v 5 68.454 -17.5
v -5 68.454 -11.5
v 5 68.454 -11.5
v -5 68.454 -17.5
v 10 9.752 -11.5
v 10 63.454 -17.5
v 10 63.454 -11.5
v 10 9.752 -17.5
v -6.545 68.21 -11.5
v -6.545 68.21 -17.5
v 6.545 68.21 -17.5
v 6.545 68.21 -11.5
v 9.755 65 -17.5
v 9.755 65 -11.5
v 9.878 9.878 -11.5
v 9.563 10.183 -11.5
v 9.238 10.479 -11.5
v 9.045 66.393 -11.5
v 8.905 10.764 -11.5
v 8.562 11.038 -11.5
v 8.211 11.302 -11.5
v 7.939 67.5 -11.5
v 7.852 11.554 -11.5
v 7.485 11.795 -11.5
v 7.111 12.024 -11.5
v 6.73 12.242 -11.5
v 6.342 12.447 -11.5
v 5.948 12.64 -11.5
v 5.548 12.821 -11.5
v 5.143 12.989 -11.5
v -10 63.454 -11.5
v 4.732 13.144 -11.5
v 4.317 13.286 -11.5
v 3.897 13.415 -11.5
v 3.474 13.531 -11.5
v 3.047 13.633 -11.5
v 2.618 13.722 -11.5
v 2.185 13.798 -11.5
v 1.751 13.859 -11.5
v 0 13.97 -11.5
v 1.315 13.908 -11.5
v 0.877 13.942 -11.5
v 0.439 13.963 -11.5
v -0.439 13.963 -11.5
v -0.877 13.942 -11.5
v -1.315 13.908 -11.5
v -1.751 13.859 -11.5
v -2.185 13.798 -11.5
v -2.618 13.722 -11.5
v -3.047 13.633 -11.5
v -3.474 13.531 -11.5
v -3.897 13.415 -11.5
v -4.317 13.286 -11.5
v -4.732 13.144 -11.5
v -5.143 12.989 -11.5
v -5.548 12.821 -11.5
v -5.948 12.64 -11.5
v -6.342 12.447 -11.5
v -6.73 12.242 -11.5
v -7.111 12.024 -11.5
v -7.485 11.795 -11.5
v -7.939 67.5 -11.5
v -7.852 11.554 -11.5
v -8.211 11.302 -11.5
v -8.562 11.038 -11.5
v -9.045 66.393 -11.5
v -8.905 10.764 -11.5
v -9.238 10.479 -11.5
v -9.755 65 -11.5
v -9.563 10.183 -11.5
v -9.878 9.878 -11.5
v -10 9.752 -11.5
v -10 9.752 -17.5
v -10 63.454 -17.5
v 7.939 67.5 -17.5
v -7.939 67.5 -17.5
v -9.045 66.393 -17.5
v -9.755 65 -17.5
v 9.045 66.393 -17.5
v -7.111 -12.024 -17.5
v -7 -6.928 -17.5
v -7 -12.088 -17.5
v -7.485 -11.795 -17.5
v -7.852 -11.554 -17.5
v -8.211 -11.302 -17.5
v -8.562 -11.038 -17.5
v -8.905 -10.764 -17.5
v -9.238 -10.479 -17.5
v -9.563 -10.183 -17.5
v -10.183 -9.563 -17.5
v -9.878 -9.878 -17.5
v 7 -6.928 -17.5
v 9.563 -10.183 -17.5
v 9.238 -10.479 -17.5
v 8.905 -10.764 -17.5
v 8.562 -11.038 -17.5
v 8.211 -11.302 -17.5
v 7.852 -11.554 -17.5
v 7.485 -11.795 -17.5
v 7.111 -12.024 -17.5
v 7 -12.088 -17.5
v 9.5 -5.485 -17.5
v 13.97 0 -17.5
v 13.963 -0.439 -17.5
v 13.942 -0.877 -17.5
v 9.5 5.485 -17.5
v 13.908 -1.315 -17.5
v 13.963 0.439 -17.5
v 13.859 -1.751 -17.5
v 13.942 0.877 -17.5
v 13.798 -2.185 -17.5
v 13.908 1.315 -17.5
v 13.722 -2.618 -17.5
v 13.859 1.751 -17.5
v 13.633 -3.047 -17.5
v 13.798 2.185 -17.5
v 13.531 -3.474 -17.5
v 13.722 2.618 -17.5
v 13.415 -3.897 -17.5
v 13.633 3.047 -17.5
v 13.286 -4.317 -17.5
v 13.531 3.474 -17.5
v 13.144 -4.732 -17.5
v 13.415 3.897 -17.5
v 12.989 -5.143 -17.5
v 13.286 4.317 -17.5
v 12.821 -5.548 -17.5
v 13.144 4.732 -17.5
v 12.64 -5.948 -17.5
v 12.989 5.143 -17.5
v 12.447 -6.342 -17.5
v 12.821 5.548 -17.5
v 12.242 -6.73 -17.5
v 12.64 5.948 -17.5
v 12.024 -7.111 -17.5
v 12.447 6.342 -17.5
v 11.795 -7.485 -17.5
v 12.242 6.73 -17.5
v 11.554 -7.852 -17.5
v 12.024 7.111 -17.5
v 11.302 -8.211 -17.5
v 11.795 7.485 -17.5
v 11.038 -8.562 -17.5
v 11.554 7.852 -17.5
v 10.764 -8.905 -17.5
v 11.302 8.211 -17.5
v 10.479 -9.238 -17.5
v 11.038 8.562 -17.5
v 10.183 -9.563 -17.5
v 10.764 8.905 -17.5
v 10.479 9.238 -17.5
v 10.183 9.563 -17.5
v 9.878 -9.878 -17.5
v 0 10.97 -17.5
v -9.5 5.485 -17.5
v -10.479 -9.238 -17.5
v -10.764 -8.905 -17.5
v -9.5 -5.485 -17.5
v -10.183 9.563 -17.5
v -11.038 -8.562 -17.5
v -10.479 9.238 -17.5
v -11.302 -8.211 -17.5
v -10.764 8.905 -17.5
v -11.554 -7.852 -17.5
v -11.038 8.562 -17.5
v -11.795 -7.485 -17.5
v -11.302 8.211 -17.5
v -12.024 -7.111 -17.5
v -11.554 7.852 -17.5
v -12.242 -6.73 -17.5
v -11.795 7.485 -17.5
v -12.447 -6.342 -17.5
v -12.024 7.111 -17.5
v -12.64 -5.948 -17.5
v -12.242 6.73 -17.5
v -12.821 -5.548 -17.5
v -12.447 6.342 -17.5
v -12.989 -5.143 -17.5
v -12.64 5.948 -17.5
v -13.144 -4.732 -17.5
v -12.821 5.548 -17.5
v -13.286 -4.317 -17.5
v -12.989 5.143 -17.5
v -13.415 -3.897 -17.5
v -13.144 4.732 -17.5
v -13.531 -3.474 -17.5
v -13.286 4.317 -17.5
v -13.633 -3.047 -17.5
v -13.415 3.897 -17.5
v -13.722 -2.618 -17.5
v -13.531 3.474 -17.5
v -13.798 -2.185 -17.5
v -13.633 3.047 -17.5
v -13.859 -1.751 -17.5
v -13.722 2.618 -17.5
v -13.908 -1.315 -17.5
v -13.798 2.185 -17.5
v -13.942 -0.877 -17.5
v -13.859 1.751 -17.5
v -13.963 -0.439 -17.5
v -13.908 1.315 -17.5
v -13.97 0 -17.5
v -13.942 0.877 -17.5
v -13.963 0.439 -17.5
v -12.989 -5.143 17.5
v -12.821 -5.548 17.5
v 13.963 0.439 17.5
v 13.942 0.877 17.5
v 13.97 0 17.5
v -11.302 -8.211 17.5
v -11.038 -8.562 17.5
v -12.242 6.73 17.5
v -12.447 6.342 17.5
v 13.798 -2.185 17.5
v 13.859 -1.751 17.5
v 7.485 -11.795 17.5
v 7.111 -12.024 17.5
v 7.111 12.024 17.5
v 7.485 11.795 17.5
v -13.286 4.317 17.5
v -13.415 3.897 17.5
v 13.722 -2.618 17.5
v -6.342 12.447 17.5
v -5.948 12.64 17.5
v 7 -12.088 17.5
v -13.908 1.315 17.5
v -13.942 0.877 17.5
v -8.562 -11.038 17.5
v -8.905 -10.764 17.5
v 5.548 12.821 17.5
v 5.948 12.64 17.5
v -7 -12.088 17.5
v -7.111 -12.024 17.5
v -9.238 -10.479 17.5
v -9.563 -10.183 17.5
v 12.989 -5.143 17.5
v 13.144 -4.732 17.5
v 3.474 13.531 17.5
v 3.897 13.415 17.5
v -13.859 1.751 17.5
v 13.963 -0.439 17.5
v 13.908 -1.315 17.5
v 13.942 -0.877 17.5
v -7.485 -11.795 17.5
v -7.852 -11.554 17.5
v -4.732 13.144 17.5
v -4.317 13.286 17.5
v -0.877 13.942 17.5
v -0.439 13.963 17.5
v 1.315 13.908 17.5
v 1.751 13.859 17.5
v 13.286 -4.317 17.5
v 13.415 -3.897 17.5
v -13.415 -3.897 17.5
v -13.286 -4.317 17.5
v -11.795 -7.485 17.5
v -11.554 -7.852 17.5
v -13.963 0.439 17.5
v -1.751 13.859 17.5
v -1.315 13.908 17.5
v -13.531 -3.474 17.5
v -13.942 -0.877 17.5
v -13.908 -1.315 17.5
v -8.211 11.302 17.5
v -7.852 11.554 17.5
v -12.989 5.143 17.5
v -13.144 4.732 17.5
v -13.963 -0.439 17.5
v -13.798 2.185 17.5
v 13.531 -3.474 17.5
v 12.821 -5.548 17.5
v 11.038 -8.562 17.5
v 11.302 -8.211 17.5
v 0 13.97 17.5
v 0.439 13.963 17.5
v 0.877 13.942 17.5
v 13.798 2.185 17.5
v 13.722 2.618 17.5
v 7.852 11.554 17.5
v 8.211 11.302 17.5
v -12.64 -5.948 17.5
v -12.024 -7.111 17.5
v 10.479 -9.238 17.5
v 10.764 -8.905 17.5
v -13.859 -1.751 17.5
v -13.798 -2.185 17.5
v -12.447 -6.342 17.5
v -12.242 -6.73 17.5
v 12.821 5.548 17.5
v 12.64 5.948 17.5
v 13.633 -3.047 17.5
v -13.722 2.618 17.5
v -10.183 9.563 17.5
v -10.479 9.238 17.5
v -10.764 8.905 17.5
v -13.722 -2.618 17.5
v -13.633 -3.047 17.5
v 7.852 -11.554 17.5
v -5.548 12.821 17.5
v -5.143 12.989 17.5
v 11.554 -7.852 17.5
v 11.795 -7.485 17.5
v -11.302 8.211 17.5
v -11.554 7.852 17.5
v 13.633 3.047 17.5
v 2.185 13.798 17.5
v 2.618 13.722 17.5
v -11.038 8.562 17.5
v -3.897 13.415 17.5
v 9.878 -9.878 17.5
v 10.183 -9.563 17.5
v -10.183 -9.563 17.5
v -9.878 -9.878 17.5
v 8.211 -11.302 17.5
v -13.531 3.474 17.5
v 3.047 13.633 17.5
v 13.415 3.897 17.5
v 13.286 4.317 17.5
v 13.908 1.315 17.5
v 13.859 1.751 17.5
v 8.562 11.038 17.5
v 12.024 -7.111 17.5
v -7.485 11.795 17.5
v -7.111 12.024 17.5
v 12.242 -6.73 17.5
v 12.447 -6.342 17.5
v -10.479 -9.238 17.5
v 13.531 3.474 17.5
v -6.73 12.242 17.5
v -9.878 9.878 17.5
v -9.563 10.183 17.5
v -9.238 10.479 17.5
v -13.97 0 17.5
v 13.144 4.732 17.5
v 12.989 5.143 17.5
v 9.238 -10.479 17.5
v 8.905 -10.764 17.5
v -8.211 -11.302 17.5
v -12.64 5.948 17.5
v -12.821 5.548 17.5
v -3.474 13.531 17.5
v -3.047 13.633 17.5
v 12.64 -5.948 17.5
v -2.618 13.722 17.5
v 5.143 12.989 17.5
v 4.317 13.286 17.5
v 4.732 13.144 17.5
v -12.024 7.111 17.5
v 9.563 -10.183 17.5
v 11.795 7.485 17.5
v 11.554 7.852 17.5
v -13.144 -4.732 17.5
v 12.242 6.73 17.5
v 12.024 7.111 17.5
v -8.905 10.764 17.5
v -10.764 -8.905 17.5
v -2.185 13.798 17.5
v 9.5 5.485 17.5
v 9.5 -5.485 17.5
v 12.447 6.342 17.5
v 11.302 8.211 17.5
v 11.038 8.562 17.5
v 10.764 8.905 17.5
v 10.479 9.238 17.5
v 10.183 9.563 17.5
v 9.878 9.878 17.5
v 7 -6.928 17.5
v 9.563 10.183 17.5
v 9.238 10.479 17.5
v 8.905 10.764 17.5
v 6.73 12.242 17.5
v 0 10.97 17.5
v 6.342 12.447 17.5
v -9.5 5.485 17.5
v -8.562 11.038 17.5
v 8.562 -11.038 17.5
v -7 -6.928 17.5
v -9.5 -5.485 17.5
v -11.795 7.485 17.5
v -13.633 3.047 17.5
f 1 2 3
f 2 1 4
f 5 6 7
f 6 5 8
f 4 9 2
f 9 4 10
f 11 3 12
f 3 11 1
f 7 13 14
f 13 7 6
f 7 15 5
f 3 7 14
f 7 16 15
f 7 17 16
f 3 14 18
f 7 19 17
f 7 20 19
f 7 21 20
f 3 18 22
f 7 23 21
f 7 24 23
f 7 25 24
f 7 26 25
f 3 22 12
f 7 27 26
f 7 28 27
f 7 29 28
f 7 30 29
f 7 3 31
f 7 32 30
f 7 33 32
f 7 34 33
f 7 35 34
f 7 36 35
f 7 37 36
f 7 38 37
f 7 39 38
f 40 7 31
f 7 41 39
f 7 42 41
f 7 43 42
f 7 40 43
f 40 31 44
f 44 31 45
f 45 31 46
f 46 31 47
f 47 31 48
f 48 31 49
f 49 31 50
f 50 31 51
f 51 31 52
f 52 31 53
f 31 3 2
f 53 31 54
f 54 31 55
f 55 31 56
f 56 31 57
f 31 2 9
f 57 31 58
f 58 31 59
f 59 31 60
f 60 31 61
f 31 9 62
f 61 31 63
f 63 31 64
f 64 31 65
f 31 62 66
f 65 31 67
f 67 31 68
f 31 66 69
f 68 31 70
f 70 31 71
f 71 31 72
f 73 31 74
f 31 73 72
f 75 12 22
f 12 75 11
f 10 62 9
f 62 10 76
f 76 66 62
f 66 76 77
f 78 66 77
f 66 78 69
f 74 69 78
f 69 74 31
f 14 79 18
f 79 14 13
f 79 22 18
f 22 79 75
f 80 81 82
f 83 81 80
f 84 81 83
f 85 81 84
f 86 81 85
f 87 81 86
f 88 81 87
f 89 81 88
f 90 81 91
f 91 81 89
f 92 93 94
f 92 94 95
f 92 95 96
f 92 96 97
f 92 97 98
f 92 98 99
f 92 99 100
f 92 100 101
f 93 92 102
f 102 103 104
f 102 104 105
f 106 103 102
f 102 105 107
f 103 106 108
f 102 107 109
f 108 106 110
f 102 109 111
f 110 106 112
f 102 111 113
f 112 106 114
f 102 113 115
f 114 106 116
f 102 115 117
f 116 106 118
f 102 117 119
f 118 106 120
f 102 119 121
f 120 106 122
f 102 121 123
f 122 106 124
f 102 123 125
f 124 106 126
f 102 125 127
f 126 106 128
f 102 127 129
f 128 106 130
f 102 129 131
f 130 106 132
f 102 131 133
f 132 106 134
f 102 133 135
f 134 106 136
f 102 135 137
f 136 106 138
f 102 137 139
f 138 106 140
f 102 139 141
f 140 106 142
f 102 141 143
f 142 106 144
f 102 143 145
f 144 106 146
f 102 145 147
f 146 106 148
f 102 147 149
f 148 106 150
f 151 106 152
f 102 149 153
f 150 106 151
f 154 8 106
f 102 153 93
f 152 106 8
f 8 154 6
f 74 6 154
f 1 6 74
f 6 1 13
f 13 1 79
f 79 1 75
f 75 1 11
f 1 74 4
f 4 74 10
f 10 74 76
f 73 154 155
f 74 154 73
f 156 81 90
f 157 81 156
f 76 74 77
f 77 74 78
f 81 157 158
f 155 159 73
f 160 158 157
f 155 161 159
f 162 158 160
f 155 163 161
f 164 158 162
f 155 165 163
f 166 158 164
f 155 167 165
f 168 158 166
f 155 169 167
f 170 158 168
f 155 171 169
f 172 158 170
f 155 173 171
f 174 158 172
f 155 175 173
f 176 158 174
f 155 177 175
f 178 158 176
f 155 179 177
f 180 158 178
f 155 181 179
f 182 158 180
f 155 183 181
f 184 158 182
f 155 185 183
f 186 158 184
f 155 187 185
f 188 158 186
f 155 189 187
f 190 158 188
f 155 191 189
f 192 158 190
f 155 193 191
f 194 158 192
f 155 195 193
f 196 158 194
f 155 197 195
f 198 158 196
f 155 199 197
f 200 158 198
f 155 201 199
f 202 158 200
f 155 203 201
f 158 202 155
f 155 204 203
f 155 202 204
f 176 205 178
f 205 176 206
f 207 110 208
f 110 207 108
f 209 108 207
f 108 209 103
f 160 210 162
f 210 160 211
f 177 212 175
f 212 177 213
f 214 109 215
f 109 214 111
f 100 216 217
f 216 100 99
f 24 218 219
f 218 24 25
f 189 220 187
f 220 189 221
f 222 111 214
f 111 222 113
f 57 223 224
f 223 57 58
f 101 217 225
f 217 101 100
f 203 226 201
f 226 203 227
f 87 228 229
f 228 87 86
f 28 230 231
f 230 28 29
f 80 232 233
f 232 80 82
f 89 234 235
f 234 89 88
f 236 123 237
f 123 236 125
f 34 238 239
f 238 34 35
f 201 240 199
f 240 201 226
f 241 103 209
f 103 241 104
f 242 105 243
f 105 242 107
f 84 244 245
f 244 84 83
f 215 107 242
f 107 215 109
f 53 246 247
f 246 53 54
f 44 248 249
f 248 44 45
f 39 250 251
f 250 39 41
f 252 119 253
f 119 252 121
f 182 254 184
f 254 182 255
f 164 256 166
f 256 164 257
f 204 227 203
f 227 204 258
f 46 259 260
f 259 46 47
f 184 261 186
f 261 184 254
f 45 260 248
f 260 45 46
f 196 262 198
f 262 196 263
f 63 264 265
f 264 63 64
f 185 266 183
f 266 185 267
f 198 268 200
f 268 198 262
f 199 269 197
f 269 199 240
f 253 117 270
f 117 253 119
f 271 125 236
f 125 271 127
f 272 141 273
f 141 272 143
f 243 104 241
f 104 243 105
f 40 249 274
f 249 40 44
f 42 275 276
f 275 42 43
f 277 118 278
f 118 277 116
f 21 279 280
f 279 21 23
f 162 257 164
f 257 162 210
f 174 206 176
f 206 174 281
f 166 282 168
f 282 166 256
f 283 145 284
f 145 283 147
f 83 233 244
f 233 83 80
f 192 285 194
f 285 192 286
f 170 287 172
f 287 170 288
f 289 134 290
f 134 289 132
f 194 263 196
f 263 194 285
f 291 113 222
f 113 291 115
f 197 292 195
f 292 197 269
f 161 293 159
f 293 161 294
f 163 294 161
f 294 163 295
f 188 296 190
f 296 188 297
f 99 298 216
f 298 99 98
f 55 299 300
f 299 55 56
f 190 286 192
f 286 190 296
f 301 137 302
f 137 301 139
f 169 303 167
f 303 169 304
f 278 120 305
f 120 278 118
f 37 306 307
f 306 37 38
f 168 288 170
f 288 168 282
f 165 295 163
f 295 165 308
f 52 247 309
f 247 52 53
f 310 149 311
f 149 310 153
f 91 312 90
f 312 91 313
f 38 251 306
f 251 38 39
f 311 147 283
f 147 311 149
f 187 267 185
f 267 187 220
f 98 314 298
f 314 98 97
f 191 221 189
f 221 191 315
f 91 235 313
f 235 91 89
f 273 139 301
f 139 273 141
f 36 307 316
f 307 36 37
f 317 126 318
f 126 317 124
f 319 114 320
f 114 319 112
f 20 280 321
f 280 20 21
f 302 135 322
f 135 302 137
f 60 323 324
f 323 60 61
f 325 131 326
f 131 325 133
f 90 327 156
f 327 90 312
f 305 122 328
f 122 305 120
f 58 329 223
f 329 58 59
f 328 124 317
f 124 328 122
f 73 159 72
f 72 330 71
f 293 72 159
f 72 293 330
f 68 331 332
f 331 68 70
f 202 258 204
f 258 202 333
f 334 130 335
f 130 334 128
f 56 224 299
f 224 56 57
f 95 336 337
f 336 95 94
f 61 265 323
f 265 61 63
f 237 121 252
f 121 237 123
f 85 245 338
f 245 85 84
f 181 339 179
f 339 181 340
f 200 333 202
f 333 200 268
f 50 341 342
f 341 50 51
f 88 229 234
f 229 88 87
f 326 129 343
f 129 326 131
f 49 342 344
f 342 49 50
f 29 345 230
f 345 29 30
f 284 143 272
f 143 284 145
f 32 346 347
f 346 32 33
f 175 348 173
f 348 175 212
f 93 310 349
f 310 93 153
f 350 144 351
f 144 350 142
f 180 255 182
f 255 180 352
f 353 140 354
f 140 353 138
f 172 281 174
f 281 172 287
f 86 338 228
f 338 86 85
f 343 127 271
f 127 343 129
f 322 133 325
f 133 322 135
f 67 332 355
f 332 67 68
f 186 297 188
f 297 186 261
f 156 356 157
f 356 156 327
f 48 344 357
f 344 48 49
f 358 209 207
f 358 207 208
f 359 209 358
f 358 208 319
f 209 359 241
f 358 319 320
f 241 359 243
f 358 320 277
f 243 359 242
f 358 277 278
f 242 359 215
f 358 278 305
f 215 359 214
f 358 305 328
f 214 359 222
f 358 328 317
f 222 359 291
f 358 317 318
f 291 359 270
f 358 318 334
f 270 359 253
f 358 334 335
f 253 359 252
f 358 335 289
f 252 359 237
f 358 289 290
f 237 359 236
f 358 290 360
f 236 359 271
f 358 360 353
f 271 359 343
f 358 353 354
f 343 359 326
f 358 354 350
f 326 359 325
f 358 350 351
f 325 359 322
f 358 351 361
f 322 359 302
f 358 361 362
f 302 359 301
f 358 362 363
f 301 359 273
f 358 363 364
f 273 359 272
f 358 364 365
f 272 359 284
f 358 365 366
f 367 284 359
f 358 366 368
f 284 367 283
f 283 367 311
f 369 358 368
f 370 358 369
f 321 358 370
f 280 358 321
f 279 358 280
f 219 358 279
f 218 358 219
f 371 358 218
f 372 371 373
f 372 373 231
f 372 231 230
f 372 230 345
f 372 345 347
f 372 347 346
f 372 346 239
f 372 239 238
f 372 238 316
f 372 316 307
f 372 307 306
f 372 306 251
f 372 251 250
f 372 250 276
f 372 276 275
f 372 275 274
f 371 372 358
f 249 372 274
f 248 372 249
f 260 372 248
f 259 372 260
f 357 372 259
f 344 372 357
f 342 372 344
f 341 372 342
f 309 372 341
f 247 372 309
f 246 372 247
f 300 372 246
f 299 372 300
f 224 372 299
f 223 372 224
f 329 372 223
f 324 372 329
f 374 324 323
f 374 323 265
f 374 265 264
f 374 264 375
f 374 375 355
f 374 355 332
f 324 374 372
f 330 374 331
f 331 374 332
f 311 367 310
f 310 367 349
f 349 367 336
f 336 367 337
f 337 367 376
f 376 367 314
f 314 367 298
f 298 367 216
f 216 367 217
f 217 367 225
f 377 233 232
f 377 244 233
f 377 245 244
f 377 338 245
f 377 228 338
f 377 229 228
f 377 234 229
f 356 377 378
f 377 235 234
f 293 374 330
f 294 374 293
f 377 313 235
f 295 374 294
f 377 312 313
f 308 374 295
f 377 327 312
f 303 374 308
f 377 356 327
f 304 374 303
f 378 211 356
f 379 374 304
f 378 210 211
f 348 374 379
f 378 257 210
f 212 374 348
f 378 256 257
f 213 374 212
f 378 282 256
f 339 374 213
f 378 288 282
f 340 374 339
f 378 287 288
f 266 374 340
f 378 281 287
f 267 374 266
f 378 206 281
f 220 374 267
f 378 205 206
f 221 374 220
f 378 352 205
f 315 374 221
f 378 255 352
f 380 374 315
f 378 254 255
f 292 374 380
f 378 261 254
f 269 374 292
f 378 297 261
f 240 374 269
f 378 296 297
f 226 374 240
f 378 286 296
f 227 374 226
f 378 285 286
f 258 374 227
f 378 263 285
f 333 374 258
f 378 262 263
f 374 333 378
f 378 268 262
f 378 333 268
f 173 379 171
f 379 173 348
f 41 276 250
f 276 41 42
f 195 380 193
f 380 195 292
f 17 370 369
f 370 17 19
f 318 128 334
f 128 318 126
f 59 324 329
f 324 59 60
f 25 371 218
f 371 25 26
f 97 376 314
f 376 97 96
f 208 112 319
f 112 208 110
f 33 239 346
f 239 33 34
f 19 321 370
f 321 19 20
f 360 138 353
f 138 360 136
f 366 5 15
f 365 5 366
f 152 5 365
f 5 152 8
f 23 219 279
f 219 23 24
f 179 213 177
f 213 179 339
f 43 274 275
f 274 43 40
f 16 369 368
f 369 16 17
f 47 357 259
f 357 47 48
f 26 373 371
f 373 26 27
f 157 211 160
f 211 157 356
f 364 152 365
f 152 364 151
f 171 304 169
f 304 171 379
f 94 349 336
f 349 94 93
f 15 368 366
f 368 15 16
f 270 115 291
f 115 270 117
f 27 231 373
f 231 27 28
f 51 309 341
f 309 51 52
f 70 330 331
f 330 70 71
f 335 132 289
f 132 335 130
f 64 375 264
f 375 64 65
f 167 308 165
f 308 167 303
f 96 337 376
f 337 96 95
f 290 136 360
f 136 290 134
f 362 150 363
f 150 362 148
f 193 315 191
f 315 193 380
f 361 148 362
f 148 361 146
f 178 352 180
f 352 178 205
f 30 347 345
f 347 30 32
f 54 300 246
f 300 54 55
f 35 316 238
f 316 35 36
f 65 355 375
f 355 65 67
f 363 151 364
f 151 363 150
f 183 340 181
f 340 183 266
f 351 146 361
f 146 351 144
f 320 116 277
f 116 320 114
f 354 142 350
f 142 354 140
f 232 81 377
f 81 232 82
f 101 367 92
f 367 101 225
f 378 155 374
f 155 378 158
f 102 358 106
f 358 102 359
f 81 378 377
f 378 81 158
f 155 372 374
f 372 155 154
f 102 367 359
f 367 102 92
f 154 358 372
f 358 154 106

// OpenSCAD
nutDiameter = 19; // [6.0:0.1:100.1]
nutHeight = 30; // [20:100]
nutWall = 3; // [1:30]

nutOpening = nutDiameter-5;

handleThickness = 5; // [3:100]
handleLength = 50; // [50:200]
handleRadius = 5;


outsideRadius = (nutDiameter/2)/cos(30)+nutWall;
handleWidth = 20;

difference()
{
    union()
    {
        // Handle
        $fn=20;
        minkowski()
        {
            translate([0,(handleLength-(handleRadius*2))/2+outsideRadius+(handleRadius/2),-nutHeight/2])
                linear_extrude(height = handleThickness, center = true)
                    square([handleWidth-(handleRadius*2),(handleLength-(handleRadius*2))+outsideRadius], center=true);
                    cylinder(r=handleRadius,h=1);
        }

        // Outside radius of the nut
        linear_extrude(height = nutHeight+handleThickness, center = true)
            circle(r=outsideRadius, $fn=200);
    }
    
    union()
    {
        // Cutout in the nut
        translate([0,-outsideRadius/2,0])
            linear_extrude(height = nutHeight+handleThickness+2, center = true)
                square([nutOpening,outsideRadius], center=true);
        
        // Inside nut
        rotate(a=[0,0,30])
        {
            linear_extrude(height = nutHeight+handleThickness+2, center = true)
                circle(r=(nutDiameter/2)/cos(30), $fn=6);
        }
    }
}
